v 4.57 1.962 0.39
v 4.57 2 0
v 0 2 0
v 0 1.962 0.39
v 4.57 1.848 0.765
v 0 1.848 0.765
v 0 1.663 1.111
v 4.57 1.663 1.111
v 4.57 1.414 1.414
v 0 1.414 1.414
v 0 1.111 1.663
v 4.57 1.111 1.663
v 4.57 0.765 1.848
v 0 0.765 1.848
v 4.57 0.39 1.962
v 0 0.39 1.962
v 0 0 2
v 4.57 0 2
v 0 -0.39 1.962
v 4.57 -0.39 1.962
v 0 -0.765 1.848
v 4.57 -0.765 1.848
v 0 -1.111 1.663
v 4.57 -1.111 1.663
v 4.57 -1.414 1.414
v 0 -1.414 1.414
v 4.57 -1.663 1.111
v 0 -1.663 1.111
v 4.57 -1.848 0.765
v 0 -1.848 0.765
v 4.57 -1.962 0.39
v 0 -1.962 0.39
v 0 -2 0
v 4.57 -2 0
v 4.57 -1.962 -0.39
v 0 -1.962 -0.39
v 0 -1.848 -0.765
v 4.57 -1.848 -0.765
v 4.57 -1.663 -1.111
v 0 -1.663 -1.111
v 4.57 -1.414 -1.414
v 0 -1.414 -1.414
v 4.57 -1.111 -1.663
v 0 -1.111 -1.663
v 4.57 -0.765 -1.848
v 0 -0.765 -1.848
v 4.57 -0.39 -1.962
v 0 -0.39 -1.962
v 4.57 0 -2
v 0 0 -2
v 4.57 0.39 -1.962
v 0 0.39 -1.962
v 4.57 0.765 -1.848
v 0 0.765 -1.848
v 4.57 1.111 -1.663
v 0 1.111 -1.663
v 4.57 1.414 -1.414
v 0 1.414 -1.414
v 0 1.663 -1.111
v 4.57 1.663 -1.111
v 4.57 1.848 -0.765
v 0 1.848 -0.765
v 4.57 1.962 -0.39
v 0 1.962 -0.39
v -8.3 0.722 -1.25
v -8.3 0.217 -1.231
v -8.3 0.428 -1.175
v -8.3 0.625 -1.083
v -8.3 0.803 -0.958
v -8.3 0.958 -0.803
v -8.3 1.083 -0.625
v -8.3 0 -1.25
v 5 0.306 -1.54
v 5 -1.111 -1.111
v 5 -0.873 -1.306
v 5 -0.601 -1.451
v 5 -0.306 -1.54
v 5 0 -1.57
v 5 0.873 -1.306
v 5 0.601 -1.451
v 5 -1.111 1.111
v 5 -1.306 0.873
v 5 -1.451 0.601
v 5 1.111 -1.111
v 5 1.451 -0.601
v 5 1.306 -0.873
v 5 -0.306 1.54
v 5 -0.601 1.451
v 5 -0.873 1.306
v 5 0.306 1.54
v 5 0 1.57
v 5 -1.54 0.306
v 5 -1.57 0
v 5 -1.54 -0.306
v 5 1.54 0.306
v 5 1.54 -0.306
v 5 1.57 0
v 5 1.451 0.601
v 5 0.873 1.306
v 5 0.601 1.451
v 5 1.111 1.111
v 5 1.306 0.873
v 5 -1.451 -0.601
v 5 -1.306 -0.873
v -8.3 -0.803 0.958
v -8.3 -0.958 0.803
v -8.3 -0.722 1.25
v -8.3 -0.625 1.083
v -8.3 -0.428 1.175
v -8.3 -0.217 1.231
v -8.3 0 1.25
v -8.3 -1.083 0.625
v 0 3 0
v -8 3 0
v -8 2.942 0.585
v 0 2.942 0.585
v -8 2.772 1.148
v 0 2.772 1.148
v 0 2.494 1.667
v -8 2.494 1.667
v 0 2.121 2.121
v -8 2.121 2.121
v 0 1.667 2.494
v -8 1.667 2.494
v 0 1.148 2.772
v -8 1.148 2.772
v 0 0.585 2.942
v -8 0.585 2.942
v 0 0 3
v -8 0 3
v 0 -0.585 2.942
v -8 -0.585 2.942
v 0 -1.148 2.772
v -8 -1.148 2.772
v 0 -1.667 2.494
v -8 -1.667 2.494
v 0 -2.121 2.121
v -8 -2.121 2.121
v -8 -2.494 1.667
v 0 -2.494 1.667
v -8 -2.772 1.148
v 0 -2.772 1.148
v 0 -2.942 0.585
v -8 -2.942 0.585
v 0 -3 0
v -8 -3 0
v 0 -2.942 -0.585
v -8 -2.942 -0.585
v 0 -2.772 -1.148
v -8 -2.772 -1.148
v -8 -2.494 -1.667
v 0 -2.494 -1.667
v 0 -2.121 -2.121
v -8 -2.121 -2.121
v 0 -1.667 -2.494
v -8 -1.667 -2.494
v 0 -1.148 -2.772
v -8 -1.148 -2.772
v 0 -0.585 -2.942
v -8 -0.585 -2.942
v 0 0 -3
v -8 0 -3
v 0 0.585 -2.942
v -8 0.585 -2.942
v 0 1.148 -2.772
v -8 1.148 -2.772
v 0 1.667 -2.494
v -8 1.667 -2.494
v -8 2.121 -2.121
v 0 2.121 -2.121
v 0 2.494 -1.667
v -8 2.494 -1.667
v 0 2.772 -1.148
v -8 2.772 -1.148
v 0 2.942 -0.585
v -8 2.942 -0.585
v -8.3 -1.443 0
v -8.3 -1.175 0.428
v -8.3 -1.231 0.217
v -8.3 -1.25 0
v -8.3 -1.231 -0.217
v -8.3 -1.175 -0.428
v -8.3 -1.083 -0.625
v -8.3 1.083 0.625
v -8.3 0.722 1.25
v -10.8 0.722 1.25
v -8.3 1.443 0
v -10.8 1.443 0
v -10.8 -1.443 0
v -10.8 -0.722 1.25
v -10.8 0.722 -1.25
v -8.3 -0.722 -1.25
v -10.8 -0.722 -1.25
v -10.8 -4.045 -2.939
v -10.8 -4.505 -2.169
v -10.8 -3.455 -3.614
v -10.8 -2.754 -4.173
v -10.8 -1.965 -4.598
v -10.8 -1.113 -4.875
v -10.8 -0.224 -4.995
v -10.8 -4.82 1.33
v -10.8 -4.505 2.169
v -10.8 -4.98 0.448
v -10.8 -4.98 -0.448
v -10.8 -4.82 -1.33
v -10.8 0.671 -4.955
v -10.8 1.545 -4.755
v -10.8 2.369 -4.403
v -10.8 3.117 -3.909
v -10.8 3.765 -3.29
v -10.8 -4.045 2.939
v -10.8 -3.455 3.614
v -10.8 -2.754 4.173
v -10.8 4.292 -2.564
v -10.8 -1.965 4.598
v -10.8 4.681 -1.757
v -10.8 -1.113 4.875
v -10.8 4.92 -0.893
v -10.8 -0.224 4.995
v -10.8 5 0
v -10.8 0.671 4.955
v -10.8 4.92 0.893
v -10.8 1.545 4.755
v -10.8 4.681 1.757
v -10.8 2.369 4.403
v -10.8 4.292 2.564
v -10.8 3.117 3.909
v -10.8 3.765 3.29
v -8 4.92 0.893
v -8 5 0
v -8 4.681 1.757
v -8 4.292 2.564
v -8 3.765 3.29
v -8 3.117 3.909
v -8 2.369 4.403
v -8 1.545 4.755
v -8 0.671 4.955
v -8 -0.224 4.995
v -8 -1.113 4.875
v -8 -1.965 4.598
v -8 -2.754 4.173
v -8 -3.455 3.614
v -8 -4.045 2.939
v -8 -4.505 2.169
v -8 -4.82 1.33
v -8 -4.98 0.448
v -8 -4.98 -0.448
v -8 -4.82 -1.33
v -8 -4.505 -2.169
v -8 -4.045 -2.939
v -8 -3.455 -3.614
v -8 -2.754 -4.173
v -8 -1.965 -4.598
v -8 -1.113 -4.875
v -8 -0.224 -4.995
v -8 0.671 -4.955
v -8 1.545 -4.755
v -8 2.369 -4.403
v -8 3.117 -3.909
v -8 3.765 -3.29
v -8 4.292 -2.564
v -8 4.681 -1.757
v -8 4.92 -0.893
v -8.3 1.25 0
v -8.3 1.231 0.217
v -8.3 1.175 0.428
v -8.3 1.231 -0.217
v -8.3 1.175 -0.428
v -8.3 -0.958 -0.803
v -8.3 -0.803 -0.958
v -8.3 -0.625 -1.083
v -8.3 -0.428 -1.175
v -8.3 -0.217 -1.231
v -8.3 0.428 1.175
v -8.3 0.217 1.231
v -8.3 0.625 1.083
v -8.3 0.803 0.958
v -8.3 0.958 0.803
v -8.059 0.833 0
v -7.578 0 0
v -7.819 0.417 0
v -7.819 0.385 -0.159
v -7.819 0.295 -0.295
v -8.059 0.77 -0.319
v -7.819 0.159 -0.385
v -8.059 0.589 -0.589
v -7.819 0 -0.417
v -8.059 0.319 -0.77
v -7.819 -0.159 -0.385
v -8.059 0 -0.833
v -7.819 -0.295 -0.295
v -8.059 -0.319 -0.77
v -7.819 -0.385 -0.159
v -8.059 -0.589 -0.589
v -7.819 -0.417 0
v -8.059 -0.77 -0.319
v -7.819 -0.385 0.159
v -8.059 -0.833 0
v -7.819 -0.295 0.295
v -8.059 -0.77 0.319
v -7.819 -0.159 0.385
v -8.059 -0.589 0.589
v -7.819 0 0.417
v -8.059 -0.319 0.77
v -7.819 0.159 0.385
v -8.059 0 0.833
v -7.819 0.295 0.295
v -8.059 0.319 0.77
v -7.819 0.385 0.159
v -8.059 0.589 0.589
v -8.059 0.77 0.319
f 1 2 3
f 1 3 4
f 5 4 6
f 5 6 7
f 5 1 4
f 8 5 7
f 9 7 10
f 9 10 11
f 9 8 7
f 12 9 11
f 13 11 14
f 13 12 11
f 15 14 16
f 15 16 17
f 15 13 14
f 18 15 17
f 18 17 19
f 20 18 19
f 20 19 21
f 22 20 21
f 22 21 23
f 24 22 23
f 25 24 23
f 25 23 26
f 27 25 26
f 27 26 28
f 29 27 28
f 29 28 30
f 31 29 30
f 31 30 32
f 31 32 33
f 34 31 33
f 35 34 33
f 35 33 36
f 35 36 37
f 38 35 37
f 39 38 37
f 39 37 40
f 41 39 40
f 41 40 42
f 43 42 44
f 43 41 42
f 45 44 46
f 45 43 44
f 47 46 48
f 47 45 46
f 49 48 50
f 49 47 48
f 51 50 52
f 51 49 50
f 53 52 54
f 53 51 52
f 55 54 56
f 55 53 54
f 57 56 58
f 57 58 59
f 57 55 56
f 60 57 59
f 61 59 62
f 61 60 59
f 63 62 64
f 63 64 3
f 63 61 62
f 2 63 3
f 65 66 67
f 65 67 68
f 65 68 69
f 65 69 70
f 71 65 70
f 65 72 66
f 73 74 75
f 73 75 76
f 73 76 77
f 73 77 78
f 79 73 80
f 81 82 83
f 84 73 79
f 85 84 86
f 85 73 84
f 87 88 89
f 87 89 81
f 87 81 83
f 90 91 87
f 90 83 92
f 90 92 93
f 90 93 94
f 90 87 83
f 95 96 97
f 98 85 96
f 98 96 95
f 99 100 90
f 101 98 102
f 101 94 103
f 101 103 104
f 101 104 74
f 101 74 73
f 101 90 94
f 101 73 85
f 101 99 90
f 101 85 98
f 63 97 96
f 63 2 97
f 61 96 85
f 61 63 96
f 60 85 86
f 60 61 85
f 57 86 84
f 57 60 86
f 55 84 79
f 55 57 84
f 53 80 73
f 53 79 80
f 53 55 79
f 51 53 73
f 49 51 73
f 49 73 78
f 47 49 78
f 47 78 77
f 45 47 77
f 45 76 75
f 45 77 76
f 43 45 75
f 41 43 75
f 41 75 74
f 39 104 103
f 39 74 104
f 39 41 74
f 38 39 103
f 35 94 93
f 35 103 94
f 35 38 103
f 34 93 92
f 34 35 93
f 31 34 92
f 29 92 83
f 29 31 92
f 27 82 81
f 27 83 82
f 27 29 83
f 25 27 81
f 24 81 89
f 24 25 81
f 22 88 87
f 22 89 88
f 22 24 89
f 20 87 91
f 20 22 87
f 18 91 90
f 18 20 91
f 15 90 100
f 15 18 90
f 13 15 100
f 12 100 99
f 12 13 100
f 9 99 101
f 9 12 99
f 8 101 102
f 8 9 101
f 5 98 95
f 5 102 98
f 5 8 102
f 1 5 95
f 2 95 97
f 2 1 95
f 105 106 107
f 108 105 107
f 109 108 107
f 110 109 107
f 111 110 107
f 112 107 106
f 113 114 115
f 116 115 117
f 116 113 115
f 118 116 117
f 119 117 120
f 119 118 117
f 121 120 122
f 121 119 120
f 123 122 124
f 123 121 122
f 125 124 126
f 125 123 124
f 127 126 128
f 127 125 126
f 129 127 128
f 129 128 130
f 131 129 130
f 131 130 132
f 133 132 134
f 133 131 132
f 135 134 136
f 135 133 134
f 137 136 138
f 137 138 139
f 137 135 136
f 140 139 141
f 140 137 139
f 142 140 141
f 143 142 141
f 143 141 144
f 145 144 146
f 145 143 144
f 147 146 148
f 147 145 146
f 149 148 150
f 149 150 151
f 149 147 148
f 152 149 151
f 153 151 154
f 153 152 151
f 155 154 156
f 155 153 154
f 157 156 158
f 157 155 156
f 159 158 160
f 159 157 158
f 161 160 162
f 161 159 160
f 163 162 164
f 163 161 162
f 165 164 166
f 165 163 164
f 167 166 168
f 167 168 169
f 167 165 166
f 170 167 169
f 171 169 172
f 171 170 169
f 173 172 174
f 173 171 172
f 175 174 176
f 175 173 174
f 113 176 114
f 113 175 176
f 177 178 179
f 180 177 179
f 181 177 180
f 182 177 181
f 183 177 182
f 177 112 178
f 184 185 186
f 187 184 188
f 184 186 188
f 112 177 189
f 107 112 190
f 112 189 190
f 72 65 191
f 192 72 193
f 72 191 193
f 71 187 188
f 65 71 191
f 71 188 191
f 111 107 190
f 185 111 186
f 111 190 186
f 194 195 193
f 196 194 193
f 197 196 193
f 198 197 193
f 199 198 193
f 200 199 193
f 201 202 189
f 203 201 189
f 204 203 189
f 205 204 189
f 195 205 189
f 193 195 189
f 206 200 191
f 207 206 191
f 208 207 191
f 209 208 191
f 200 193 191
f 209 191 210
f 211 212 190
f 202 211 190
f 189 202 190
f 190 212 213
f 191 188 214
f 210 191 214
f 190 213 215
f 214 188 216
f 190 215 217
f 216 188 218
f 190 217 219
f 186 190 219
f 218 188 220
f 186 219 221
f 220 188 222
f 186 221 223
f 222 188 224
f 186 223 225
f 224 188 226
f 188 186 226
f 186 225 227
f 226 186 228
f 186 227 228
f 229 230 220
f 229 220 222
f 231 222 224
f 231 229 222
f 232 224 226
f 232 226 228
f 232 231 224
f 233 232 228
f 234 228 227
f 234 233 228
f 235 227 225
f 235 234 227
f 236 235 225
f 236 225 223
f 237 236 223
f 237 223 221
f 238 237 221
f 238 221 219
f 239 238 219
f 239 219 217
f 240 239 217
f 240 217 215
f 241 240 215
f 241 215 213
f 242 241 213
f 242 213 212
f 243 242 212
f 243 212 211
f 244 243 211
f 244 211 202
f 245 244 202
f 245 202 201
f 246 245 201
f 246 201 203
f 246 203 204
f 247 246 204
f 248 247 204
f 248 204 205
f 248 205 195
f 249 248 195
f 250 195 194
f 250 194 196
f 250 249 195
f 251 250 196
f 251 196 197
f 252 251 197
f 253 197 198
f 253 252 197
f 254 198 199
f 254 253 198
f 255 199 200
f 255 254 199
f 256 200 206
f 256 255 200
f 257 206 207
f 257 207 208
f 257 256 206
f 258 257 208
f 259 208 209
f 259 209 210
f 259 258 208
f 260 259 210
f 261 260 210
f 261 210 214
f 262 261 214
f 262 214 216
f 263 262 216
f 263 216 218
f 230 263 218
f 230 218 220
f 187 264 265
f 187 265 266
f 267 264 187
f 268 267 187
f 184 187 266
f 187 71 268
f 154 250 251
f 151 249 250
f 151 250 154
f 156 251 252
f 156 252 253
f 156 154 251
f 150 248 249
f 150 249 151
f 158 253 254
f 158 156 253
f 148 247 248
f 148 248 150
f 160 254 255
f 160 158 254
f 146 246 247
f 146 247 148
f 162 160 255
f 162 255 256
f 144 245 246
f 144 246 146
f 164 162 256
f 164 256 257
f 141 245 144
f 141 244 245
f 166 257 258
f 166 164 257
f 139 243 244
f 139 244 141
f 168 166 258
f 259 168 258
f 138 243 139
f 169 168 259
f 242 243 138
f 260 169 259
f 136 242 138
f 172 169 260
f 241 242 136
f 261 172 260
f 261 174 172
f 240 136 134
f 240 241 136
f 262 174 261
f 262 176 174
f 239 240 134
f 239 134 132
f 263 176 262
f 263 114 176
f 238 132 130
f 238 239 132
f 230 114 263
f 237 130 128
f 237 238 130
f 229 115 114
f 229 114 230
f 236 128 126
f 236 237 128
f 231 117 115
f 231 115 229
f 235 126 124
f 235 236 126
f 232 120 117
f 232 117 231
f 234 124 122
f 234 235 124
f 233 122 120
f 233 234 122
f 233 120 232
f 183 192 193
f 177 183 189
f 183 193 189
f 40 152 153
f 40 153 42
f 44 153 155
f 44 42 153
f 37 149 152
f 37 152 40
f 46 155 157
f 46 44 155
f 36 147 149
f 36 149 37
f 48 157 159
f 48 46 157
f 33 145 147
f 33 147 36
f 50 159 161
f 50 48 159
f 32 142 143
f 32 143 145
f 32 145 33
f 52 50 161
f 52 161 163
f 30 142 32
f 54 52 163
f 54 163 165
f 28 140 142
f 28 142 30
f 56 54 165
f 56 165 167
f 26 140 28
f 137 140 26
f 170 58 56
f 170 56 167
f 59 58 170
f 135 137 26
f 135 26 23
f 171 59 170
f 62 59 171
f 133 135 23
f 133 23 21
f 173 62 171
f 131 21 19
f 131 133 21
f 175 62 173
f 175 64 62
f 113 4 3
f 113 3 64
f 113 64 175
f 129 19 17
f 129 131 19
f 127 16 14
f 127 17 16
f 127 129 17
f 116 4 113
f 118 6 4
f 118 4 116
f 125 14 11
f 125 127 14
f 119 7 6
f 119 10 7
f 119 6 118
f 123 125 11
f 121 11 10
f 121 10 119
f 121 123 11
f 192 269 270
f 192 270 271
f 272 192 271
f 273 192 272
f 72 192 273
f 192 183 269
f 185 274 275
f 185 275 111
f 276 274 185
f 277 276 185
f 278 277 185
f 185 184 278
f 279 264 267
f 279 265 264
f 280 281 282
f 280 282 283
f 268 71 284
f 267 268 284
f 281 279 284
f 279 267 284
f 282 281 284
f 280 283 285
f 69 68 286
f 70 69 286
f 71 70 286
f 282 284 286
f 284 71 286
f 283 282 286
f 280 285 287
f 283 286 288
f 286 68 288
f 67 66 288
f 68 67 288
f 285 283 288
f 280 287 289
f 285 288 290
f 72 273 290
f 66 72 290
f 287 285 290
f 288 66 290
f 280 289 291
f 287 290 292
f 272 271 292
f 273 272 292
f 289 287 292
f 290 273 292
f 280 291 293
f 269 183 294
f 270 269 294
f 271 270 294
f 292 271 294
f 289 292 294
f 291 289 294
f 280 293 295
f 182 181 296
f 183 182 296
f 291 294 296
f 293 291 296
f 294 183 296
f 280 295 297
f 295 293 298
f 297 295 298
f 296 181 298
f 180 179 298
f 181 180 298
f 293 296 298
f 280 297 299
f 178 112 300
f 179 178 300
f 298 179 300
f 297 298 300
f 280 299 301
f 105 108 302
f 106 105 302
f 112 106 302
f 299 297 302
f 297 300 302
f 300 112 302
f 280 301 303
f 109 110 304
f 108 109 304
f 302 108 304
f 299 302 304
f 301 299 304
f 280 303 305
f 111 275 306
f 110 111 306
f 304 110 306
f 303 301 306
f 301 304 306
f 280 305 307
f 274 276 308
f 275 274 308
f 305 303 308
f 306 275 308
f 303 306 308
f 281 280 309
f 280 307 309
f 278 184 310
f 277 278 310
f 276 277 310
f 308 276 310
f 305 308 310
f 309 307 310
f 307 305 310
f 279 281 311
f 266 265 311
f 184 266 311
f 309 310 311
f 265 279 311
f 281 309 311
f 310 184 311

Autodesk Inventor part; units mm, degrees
ref_plane "YZ Plane" through (0, 0, 0) normal (1, 0, 0) x (0, 1, 0)
ref_plane "XZ Plane" through (0, 0, 0) normal (0, 1, 0) x (-1, 0, 0)
ref_plane "XY Plane" through (0, 0, 0) normal (0, 0, 1) x (1, 0, 0)
sketch "Sketch_1" plane through (0, 0, 0) normal (0, 0, 1) x (1, 0, 0)
  line L0 (5, 0) -> (-10.8, 0)
  line L1 (-10.8, 0) -> (-10.8, 5)
  line L2 (-10.8, 5) -> (-8, 5)
  line L3 (-8, 5) -> (-8, 3)
  line L4 (-8, 3) -> (0, 3)
  line L5 (0, 3) -> (0, 2)
  line L6 (0, 2) -> (4.5705, 2)
  line L7 (4.5705, 2) -> (5, 1.5705)
  line L8 (5, 1.5705) -> (5, 0)
  line L9 (5, 0) -> (-10.8, 0)
revolve "Revolution1" add sketch "Sketch_1" angle 360 about axis through (5, 0, 0) along (1, 0, 0)
thread "Thread1" size "M4x0.7" class "6g" standard "ISO Metric profile" length 3.3705
sketch "Sketch_2" plane through (-10.8, 0, 0) normal (-1, 0, 0) x (0, 1, 0)
  line L0 (-1.4434, 0) -> (-0.7217, -1.25)
  line L1 (-0.7217, -1.25) -> (0.7217, -1.25)
  line L2 (0.7217, -1.25) -> (1.4434, 0)
  line L3 (1.4434, 0) -> (0.7217, 1.25)
  line L4 (0.7217, 1.25) -> (-0.7217, 1.25)
  line L5 (-0.7217, 1.25) -> (-1.4434, 0)
extrude "Extrusion1" cut sketch "Sketch_2" against normal blind 2.5
sketch "Sketch_3" plane through (0, 0, 0) normal (0, 0, 1) x (1, 0, 0)
  line L0 (-7.5783, 0) -> (-8.3, 0)
  line L1 (-8.3, 0) -> (-8.3, 1.25)
  line L2 (-8.3, 1.25) -> (-7.5783, 0)
  line L3 (-7.5783, 0) -> (-8.3, 0)
revolve "Revolution2" cut sketch "Sketch_3" angle 360 about axis through (-7.5783, 0, 0) along (1, 0, 0)
properties part number "DBB4-8-5" material "스테인리스스틸"
